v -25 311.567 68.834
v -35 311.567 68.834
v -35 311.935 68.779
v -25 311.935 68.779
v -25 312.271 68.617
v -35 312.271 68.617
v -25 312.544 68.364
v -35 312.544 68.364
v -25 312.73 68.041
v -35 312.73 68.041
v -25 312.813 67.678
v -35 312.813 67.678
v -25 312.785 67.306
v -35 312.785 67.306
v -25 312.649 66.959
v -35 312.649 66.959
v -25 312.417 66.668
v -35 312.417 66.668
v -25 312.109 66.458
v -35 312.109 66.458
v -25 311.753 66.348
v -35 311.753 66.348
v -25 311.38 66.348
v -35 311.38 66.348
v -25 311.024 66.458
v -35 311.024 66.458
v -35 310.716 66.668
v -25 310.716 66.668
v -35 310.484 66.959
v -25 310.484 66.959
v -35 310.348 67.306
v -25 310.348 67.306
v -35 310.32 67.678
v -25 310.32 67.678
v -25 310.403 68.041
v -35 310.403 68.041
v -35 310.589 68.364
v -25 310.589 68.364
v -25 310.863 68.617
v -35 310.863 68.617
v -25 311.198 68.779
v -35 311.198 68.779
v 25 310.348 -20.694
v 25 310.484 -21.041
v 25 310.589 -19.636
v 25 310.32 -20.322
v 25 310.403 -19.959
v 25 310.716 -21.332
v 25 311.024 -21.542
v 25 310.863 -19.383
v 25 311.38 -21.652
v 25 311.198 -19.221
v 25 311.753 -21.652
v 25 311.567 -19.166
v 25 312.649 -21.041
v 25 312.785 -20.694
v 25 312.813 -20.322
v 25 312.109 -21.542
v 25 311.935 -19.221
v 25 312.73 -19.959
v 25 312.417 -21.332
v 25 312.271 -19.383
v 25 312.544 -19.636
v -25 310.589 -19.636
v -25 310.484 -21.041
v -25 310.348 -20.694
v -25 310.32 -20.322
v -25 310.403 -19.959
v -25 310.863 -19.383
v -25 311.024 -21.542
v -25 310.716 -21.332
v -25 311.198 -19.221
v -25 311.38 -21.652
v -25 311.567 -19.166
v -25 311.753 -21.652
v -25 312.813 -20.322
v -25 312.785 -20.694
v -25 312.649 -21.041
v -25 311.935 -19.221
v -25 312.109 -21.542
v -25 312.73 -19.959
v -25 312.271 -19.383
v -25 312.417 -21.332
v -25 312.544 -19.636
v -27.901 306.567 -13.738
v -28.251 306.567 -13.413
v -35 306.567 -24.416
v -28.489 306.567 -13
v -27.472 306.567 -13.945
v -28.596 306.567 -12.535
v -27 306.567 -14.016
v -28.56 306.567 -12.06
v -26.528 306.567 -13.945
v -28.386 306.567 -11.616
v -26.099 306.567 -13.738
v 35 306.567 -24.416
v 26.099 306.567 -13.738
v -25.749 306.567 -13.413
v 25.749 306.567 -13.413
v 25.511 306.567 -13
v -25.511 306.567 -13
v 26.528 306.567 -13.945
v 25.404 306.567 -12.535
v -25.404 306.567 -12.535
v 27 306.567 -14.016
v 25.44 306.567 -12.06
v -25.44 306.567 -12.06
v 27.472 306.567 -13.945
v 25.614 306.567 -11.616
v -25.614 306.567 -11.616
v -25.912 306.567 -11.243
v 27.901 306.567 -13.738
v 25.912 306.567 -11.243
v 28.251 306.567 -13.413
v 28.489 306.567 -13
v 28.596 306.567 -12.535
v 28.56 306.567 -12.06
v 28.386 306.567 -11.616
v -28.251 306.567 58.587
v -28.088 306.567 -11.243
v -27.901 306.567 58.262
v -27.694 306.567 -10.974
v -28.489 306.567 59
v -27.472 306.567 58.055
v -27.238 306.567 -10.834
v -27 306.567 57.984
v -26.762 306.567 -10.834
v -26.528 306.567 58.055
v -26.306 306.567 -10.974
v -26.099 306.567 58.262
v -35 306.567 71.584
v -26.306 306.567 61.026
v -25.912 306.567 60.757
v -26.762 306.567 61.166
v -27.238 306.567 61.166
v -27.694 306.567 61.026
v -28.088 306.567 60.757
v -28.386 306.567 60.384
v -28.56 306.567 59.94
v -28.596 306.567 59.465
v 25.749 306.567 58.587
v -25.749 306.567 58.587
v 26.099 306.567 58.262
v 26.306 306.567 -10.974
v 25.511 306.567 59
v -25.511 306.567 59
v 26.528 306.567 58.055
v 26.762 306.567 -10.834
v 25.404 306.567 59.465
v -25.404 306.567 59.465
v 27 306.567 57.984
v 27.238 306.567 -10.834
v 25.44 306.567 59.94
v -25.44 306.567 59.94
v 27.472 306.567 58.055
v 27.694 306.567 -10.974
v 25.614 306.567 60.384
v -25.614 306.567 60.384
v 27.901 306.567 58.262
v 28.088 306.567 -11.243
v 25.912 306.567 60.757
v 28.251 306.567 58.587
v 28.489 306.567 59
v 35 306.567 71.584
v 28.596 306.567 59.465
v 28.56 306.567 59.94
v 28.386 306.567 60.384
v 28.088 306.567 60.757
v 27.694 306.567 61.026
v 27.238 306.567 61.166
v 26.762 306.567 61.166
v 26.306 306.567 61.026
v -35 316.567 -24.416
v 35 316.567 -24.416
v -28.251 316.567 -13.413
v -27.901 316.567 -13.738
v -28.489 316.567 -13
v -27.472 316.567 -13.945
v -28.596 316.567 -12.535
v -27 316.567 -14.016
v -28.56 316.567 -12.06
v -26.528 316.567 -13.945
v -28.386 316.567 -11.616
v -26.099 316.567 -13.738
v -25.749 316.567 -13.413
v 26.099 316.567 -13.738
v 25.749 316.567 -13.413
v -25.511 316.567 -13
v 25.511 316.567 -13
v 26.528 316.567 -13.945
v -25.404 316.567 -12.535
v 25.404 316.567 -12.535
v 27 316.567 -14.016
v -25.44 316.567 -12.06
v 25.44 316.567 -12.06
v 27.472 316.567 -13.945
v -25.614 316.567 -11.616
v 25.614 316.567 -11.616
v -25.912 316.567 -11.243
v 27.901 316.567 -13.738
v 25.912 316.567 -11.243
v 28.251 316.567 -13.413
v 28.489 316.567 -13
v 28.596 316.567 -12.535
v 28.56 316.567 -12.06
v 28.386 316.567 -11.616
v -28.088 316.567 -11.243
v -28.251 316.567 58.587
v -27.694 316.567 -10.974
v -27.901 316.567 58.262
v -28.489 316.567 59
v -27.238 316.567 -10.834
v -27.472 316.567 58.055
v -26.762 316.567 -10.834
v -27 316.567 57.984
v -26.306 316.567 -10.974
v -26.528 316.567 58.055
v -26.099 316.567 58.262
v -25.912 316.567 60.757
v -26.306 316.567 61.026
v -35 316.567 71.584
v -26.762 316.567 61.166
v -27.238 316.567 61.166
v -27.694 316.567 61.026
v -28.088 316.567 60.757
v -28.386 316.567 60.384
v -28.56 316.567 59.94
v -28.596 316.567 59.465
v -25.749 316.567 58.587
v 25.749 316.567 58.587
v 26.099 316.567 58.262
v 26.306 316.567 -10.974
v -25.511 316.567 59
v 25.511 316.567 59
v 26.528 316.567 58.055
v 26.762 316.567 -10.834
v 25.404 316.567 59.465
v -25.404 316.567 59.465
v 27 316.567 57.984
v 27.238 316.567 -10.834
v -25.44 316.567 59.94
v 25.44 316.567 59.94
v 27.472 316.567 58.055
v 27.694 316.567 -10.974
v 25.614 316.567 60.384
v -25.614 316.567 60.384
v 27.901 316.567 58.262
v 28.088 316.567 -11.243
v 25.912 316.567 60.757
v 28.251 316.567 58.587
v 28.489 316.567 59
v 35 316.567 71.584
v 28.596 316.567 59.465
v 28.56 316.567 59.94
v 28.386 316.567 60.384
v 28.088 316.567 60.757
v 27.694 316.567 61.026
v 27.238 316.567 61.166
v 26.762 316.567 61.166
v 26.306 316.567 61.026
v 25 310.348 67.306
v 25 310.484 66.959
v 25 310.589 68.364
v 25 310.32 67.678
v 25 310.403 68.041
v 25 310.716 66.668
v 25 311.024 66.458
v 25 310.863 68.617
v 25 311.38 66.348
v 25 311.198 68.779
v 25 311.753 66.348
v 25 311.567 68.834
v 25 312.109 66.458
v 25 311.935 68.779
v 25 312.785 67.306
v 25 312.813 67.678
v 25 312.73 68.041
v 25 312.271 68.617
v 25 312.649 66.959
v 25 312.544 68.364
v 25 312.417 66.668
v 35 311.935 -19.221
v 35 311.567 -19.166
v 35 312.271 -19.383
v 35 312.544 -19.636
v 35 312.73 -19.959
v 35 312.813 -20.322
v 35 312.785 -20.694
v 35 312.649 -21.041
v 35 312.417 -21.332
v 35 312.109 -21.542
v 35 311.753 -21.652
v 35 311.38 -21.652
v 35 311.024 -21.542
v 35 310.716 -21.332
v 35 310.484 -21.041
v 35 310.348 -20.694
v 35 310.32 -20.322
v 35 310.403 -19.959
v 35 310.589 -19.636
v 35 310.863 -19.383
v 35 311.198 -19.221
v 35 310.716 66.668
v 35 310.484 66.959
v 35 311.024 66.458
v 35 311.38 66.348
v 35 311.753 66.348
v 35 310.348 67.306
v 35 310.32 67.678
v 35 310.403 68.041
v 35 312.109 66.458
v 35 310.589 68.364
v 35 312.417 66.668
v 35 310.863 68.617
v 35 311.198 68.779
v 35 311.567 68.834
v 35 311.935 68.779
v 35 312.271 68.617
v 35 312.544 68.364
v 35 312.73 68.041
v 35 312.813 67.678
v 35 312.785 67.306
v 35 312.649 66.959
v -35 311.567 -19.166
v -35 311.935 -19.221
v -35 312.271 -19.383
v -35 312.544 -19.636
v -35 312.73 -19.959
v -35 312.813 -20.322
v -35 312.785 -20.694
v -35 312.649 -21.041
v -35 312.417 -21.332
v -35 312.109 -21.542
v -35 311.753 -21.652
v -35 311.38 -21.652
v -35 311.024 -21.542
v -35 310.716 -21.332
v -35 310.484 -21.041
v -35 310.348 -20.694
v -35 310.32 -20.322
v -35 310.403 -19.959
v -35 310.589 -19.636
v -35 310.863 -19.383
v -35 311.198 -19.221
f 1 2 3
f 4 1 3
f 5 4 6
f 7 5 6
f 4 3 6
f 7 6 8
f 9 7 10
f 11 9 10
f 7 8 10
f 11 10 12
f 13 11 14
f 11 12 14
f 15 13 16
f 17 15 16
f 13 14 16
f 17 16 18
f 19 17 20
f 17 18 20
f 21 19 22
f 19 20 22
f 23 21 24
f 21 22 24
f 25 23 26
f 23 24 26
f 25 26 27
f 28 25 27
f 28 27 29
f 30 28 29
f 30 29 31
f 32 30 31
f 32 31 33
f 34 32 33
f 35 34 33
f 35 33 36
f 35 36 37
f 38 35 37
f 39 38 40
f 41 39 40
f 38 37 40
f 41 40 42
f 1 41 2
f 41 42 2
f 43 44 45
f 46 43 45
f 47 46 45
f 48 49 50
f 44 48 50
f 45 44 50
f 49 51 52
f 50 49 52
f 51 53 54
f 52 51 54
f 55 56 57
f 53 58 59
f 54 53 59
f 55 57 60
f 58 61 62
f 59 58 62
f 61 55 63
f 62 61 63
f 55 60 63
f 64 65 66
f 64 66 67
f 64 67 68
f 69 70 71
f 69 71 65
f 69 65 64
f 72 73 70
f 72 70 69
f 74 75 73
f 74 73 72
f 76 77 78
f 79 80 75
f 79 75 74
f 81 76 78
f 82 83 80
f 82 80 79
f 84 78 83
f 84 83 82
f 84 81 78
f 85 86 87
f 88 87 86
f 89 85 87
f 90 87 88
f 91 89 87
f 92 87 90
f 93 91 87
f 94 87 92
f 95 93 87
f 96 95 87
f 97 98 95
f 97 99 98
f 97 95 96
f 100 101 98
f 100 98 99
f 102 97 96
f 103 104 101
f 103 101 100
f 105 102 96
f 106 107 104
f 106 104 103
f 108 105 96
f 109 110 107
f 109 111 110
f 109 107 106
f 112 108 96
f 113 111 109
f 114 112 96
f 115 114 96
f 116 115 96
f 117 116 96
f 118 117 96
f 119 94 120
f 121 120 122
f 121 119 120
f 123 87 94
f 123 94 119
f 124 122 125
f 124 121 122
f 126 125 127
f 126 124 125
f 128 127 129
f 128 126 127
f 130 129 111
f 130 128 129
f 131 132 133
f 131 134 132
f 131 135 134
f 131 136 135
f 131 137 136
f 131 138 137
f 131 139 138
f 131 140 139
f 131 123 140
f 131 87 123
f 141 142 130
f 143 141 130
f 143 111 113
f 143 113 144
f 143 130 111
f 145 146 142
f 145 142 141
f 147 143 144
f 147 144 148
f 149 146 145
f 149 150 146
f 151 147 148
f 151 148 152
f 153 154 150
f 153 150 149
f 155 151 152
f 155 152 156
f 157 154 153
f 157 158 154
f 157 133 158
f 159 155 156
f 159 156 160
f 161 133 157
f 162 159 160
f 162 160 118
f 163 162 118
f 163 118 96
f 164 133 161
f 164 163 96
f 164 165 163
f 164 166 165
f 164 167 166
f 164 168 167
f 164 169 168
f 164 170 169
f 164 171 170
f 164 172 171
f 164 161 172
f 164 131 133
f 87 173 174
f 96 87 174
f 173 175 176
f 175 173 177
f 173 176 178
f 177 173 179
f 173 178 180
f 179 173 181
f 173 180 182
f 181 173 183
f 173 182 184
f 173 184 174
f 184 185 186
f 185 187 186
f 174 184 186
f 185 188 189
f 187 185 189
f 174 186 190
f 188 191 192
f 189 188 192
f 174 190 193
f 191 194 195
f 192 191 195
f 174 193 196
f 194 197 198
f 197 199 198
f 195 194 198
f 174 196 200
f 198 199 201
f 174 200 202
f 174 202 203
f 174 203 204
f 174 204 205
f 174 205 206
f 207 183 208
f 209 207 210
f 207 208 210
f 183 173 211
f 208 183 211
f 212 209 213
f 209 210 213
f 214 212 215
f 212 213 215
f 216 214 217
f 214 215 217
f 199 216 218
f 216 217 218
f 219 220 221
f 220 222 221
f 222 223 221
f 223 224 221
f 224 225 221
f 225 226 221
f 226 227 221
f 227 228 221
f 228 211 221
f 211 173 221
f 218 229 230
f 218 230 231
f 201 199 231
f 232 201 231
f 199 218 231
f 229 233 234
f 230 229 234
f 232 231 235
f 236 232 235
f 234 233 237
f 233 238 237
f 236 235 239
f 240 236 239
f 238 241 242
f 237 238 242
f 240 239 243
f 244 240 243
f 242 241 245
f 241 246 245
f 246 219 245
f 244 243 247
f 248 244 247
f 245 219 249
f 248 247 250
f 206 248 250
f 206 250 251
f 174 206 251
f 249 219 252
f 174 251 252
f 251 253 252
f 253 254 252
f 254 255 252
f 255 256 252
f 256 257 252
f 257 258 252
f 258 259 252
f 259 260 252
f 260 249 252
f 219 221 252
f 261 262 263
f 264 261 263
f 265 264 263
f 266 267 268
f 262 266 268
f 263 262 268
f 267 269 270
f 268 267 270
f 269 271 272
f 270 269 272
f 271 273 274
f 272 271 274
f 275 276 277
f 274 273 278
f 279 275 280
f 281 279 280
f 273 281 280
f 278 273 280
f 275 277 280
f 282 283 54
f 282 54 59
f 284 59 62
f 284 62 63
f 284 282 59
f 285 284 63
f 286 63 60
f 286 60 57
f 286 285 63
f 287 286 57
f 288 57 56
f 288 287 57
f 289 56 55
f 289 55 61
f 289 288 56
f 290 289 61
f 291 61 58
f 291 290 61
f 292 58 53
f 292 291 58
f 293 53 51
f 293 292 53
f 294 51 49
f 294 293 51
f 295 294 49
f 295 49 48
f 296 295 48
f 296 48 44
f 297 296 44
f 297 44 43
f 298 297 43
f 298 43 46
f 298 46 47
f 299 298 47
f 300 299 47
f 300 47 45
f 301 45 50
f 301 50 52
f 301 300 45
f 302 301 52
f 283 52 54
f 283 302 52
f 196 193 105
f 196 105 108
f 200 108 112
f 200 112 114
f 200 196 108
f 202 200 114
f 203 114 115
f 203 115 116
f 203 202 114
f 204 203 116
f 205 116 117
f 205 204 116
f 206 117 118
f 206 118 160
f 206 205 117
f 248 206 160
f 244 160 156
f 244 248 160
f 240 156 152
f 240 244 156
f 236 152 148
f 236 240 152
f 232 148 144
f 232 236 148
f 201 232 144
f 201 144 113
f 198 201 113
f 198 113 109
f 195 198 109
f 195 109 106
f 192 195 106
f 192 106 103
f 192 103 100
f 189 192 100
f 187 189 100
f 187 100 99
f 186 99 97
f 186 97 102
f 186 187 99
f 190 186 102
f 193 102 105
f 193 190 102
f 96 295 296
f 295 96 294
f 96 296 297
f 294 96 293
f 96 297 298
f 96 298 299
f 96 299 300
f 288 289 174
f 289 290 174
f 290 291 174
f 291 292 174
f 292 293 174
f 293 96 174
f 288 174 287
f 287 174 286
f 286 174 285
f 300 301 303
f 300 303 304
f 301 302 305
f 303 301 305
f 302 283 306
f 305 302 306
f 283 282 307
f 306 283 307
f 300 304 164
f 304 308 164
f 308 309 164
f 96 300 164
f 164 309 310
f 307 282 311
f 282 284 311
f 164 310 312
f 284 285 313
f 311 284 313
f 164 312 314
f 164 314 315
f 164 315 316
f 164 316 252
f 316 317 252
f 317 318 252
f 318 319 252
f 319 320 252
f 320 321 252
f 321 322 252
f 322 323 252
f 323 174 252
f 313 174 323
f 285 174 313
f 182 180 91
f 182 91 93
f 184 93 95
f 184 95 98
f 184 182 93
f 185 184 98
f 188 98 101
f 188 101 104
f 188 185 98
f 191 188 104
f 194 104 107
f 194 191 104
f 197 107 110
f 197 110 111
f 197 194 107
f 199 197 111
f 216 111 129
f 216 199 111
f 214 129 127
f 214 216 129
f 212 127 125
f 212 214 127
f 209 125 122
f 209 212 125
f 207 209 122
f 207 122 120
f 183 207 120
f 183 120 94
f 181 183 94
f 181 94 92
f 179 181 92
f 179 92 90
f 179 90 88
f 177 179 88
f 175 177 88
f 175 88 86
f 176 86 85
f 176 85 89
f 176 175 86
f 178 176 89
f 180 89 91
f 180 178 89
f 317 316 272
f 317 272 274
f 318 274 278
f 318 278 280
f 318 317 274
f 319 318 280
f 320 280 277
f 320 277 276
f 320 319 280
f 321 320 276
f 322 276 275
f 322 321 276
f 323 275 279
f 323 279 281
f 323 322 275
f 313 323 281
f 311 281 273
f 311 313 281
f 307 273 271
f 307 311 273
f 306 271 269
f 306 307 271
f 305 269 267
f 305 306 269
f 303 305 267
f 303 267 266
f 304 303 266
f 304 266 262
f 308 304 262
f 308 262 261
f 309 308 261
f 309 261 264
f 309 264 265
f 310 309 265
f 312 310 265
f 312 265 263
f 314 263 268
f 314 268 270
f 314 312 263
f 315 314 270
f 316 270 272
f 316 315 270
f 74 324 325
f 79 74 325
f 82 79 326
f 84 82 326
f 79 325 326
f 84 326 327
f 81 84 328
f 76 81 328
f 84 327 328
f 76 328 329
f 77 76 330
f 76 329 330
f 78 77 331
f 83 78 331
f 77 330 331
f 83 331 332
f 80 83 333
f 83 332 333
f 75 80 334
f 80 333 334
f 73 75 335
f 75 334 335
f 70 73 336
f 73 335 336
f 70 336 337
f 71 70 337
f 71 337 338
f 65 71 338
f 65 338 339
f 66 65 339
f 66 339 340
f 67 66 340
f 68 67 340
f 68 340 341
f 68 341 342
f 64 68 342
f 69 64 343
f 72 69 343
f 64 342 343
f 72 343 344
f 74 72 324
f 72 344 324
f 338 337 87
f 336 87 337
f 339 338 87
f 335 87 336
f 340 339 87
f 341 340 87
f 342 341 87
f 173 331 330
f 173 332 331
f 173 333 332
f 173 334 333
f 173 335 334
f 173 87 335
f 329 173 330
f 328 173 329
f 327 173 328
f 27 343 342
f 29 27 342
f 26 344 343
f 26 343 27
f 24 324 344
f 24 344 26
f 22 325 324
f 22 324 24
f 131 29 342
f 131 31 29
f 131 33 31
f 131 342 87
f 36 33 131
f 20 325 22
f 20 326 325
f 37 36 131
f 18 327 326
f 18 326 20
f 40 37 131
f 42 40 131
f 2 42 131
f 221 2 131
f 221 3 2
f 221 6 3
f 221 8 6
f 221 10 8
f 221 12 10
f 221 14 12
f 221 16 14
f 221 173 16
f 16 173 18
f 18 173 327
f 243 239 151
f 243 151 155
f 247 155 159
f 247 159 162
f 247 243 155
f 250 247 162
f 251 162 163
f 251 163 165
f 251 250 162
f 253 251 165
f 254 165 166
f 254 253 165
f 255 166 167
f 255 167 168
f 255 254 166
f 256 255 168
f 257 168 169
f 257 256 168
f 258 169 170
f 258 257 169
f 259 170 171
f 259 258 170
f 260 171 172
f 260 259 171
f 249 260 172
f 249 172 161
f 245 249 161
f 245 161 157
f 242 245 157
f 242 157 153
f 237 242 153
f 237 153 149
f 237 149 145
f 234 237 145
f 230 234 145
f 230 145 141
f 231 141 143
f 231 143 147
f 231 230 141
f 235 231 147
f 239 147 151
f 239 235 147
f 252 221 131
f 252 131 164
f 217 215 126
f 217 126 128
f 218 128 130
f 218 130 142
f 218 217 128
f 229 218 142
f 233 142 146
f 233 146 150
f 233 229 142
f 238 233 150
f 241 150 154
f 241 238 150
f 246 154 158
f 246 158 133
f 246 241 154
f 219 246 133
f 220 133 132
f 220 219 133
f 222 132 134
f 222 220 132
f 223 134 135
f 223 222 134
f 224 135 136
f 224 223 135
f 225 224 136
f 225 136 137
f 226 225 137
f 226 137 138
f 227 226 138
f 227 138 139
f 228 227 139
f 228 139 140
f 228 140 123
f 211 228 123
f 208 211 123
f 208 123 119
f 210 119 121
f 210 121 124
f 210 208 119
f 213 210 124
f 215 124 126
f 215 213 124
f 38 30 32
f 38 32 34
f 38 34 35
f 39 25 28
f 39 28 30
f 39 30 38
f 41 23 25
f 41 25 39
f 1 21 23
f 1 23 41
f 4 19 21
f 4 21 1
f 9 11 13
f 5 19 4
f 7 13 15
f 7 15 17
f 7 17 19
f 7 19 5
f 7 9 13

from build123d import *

# Parameters (mm, degrees)
SKETCH1_W           = 70
SKETCH1_H           = 96
SKETCH1_R           = 1.6
BOSS_EXTRUDE1_DEPTH = 10
SKETCH2_R           = 1.25
CUT_EXTRUDE1_DEPTH  = 10


with BuildPart() as part:
    # Sketch1 → Boss-Extrude1 (new body)
    with BuildSketch(Plane.XZ.offset(-316.566699204)):
        with Locations((0, 23.58434623)):
            Rectangle(SKETCH1_W, SKETCH1_H)
        with Locations(Location((-27, 59.58434623, 0), (0, 0, 270))):
            Circle(SKETCH1_R, mode=Mode.SUBTRACT)
        with Locations(Location((27, 59.58434623, 0), (0, 0, 270))):
            Circle(SKETCH1_R, mode=Mode.SUBTRACT)
        with Locations(Location((-27, -12.41565377, 0), (0, 0, 270))):
            Circle(SKETCH1_R, mode=Mode.SUBTRACT)
        with Locations(Location((27, -12.41565377, 0), (0, 0, 270))):
            Circle(SKETCH1_R, mode=Mode.SUBTRACT)
    extrude(amount=BOSS_EXTRUDE1_DEPTH)

    # Sketch2 → Cut-Extrude1 (cut)
    with BuildSketch(Plane.ZY.offset(35)):
        with Locations((-20.41565377, 311.566699204)):
            Circle(SKETCH2_R)
        with Locations((67.58434623, 311.566699204)):
            Circle(SKETCH2_R)
    cut_extrude1 = extrude(amount=-CUT_EXTRUDE1_DEPTH, mode=Mode.SUBTRACT)

    # Mirror1: Cut-Extrude1 across plane
    add(cut_extrude1.mirror(Plane(origin=(0, 0, 0), x_dir=(0, 0, 1), z_dir=(1, 0, 0))), mode=Mode.SUBTRACT)


solid = part.part
